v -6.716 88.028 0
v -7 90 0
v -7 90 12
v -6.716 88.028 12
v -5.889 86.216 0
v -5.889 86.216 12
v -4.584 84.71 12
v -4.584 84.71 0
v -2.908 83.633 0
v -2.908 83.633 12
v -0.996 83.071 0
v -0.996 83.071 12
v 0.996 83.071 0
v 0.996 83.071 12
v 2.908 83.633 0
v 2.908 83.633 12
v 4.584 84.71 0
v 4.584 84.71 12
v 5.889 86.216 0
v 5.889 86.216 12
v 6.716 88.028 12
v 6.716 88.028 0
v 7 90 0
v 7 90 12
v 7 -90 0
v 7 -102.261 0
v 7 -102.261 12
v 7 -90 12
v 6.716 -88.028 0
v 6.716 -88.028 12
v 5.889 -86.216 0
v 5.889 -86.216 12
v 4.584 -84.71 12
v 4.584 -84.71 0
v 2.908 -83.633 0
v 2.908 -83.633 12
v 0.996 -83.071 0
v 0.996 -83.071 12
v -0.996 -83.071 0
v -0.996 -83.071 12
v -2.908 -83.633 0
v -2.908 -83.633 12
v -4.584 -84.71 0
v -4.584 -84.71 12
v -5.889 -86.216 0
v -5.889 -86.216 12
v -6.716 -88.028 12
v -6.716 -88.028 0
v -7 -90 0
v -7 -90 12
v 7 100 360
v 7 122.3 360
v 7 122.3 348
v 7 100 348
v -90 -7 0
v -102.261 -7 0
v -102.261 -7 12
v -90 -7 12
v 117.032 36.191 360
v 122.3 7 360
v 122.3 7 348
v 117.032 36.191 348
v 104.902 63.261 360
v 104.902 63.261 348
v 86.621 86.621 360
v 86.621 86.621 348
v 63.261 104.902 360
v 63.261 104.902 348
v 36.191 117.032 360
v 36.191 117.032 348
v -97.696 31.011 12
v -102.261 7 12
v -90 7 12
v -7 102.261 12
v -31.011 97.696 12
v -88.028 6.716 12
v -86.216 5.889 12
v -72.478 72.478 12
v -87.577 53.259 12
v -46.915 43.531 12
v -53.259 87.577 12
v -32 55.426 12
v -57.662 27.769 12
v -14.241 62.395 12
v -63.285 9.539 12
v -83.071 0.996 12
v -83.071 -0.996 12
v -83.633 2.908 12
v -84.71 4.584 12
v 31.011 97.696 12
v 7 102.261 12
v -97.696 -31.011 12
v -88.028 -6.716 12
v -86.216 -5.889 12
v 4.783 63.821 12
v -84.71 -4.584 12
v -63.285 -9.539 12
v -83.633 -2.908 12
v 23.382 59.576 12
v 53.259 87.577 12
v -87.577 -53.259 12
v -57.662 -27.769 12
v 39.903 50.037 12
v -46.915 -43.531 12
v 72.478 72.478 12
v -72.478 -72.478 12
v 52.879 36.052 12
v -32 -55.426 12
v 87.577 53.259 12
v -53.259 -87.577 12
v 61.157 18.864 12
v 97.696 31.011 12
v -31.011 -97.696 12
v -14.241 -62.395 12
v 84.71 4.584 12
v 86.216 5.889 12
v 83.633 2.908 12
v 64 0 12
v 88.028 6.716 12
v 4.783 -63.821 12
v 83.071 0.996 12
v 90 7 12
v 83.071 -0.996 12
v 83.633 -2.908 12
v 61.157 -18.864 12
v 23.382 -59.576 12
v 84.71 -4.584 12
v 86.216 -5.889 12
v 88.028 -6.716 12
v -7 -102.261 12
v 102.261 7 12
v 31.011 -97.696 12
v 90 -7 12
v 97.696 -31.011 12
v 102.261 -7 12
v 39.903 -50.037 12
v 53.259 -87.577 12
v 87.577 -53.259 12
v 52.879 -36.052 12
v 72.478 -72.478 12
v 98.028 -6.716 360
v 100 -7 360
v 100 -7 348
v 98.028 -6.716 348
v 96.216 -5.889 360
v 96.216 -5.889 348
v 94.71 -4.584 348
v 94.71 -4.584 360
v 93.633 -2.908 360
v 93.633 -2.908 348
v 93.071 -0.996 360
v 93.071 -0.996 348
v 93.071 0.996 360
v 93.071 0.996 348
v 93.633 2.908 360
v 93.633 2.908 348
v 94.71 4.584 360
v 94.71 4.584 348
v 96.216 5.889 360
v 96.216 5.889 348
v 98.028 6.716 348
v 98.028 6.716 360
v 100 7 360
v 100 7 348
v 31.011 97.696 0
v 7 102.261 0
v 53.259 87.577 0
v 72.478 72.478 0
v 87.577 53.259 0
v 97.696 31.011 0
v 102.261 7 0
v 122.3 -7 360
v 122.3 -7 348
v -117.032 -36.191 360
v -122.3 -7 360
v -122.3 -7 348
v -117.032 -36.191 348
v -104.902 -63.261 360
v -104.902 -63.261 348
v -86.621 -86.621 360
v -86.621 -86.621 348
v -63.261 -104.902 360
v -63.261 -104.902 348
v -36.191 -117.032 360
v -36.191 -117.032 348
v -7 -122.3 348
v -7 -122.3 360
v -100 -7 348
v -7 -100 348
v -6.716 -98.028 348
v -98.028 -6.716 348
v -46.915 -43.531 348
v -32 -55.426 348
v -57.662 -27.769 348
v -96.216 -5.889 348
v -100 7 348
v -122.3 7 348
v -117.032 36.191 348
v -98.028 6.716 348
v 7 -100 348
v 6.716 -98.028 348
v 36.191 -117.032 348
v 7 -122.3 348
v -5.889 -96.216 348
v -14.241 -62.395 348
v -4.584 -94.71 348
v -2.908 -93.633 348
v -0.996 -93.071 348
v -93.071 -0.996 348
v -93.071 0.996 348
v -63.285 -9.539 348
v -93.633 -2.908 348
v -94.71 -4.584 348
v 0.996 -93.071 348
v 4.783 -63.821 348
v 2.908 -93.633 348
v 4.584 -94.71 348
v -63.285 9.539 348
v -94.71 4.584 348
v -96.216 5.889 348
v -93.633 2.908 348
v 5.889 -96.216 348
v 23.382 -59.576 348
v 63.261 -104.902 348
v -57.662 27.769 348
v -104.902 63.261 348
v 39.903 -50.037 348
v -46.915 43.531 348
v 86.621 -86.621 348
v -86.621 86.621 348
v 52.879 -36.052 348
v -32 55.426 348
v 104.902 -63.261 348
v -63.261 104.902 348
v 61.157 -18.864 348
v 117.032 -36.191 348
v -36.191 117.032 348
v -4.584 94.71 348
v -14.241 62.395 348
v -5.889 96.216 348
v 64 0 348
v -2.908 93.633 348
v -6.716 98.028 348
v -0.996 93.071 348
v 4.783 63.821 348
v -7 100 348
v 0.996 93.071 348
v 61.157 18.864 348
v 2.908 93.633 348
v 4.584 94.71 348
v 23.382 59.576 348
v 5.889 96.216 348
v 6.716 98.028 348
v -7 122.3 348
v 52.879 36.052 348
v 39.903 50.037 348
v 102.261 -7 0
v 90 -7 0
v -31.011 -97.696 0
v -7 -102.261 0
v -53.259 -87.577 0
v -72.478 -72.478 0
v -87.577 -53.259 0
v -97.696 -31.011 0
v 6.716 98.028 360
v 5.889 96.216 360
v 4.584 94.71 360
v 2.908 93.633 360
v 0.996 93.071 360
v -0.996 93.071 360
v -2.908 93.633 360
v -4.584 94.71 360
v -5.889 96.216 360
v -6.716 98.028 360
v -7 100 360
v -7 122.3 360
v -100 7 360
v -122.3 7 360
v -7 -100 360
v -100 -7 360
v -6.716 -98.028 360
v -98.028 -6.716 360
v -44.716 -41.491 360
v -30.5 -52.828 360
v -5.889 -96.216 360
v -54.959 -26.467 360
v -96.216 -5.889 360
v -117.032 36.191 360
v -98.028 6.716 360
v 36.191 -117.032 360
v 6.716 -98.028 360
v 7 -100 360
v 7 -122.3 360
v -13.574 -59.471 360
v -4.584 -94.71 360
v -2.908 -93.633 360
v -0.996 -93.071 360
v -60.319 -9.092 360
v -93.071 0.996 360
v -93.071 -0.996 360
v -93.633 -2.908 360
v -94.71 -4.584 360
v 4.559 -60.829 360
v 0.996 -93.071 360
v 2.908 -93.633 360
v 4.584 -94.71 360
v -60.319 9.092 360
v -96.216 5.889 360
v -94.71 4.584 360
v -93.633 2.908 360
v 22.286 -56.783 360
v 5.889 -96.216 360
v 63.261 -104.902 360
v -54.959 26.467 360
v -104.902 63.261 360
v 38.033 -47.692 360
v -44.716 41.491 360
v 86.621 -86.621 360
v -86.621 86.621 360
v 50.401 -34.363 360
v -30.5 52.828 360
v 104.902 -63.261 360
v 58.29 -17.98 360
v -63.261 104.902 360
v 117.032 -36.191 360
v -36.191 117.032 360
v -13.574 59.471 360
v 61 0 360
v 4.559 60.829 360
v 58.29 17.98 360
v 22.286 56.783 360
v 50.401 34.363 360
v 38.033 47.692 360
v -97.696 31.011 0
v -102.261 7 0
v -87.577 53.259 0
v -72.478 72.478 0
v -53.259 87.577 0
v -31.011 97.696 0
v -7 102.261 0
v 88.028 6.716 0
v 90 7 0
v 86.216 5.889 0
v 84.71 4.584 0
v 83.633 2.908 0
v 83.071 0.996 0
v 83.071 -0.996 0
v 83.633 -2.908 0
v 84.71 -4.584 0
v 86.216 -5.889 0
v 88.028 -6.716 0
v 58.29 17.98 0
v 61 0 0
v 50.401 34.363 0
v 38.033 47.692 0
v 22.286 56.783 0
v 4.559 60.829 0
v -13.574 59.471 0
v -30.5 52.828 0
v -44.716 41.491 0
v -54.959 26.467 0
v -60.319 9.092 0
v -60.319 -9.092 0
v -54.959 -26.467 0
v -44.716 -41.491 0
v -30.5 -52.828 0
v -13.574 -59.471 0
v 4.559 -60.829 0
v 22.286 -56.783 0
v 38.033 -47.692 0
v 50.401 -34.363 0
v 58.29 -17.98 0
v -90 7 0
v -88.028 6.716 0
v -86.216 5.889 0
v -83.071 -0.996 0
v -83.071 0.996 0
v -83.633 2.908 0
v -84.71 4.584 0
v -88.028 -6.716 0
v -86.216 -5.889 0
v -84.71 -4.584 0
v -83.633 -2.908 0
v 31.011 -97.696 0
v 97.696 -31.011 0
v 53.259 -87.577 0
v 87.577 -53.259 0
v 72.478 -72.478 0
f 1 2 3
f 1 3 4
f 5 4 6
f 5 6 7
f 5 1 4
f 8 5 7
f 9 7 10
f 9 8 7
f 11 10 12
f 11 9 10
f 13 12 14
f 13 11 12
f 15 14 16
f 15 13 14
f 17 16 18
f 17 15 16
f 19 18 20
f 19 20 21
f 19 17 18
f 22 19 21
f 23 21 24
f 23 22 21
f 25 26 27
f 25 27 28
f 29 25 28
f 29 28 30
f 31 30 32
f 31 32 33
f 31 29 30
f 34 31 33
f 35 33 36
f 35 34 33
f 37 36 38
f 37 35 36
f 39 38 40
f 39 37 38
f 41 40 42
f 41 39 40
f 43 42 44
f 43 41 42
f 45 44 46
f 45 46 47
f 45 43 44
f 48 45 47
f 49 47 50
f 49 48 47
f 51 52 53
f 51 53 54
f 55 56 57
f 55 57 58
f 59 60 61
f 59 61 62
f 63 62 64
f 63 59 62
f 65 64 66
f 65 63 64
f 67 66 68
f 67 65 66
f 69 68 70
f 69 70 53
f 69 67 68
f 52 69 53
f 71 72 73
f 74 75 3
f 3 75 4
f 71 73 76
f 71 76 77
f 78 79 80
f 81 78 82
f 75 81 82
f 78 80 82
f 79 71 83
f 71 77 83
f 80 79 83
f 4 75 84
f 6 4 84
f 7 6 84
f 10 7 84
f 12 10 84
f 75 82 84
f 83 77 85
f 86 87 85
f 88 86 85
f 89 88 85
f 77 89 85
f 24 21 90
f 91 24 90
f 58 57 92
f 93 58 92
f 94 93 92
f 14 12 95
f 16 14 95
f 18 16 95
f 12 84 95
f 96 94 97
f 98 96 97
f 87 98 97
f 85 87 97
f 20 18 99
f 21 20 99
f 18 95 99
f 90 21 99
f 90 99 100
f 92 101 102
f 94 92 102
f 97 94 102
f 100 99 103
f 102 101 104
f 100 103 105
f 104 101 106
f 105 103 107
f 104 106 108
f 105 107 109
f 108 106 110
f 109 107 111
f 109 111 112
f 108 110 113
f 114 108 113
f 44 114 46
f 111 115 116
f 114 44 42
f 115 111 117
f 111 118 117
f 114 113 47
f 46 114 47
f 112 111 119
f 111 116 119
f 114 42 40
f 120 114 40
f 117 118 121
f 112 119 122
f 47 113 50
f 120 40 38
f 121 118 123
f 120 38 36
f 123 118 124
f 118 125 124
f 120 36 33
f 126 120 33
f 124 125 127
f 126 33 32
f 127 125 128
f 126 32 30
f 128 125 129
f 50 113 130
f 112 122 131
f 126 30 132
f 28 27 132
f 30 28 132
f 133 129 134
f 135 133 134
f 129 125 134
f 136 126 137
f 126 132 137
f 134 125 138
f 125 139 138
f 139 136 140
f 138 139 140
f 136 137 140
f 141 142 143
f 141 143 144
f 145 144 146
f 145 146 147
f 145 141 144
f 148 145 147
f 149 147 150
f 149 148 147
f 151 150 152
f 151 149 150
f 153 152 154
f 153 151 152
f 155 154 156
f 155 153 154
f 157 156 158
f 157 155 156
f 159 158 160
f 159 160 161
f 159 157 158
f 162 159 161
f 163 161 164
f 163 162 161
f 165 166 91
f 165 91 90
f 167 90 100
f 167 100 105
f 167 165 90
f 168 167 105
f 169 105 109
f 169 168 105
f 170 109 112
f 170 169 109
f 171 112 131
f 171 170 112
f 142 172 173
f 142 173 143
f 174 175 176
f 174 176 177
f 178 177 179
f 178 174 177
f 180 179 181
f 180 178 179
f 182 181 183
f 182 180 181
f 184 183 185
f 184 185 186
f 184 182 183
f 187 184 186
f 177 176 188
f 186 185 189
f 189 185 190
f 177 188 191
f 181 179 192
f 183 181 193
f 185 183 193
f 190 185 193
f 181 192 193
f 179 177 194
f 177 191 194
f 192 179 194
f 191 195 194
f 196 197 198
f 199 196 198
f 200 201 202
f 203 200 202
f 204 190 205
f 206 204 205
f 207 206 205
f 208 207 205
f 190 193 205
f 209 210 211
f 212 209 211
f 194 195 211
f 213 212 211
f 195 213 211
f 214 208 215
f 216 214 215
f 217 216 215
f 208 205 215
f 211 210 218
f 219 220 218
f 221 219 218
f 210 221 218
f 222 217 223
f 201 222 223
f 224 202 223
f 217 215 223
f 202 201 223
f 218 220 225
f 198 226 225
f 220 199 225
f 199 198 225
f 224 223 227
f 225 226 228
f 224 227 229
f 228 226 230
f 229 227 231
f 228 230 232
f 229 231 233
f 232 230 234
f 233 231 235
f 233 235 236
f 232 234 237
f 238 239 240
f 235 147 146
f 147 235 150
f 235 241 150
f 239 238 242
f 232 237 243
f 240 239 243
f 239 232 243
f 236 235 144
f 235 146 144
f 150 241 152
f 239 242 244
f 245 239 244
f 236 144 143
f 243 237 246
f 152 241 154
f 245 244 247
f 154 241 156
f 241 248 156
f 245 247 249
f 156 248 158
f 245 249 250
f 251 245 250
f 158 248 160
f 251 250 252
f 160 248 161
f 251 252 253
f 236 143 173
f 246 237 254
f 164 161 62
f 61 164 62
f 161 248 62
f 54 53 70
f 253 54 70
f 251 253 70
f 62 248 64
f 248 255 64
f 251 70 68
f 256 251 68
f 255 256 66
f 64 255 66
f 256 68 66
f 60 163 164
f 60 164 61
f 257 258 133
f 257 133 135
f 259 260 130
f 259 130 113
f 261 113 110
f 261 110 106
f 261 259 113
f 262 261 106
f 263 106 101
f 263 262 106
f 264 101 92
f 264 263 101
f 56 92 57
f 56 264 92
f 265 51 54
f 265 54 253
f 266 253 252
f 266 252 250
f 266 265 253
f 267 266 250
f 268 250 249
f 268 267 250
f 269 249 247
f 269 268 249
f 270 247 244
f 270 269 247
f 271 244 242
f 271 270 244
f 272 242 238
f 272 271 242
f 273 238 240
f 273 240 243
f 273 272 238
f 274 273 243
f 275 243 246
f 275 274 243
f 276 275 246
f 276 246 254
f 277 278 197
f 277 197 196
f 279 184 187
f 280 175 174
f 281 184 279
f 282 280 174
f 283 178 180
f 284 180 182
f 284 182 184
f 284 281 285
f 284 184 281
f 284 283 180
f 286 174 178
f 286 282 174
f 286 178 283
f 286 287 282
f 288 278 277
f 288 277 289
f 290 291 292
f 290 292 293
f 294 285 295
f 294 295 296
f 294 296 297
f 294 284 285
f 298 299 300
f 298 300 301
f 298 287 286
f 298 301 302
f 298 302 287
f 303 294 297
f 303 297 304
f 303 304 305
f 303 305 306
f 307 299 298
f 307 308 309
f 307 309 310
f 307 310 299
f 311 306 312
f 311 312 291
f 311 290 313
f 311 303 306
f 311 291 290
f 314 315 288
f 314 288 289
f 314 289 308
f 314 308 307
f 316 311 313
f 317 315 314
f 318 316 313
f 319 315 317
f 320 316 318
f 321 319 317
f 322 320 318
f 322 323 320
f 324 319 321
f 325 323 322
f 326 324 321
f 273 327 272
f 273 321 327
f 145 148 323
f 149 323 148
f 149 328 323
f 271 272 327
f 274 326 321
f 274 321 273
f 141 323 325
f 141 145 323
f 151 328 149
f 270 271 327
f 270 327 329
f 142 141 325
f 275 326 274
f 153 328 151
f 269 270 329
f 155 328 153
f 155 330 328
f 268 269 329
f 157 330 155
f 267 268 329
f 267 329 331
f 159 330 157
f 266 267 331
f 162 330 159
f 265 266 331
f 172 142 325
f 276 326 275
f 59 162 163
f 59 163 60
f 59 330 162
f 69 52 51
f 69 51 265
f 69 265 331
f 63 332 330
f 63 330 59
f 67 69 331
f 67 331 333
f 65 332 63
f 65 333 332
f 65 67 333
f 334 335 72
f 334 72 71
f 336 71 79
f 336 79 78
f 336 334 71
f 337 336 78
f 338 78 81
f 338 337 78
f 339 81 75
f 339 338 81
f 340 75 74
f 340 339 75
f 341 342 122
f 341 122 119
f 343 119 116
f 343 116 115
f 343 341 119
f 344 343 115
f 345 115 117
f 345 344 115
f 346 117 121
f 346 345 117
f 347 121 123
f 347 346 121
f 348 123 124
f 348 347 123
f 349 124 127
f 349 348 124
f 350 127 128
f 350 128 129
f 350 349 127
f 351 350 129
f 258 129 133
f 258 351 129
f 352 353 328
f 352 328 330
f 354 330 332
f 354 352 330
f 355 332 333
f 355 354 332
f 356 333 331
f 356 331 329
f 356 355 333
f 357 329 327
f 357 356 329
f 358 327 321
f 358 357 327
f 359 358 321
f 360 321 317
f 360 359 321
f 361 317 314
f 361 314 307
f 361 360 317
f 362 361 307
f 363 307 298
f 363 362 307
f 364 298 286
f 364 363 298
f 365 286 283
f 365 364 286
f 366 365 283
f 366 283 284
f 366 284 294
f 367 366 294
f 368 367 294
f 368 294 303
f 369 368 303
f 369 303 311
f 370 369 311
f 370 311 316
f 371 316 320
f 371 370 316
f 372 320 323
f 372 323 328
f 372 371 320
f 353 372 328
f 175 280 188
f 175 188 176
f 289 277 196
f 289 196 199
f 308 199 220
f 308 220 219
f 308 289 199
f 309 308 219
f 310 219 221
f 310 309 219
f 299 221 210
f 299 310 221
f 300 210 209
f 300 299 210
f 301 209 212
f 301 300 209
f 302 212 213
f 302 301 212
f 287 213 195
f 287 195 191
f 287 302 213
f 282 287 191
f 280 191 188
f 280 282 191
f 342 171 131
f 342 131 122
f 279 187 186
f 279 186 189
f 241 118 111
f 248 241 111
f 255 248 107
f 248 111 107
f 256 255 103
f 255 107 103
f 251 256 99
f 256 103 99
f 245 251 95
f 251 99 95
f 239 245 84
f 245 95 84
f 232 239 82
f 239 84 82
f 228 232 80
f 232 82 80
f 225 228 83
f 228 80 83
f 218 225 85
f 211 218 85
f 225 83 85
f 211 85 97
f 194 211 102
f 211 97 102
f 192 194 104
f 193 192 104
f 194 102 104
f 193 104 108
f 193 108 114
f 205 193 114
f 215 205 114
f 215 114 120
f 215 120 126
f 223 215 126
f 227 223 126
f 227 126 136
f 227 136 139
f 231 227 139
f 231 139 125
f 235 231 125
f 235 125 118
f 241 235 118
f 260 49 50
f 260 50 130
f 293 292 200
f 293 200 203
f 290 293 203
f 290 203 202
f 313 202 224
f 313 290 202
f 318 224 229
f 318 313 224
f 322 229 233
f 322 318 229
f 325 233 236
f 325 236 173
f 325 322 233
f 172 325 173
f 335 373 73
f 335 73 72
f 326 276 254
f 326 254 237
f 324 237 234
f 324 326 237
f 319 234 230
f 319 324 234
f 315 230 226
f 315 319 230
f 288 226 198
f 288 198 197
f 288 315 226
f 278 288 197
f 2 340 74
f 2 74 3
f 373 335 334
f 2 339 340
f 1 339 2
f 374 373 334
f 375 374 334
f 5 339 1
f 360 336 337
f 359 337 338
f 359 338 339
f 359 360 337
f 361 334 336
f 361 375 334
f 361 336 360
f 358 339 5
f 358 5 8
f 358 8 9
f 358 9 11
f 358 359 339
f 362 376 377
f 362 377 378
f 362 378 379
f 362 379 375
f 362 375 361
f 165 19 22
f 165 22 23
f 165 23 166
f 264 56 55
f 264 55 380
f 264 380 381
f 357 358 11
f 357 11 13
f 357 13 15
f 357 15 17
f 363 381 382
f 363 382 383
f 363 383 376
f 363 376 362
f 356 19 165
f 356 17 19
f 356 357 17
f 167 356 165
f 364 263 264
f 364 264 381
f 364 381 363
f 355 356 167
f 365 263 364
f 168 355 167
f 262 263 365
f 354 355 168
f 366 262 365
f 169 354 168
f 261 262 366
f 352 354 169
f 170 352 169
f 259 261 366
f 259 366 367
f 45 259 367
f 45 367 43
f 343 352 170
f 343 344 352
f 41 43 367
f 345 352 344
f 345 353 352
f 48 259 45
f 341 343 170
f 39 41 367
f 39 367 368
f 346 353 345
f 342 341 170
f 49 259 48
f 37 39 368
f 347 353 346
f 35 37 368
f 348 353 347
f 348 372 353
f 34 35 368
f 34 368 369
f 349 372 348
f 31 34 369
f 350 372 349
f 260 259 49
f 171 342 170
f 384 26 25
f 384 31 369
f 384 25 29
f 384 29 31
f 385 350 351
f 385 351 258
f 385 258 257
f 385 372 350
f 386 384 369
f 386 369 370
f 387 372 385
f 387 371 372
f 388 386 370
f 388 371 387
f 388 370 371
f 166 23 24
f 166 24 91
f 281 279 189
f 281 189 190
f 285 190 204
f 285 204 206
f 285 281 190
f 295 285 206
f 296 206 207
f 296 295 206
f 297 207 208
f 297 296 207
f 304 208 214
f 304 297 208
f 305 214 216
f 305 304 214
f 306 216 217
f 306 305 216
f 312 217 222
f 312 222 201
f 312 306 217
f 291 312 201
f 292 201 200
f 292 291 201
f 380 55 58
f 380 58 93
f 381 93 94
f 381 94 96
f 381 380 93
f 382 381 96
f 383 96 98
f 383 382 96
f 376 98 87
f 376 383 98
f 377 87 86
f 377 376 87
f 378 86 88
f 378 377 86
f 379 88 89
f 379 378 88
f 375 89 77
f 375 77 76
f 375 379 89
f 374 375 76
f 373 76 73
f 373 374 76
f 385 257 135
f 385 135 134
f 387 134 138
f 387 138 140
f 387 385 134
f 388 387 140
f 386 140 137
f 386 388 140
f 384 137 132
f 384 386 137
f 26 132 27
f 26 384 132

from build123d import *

# Parameters (mm, degrees)
F0_R     = 64
F0_R_2   = 61
F1_DEPTH = 360
F2_R     = 64
F3_DEPTH = 12
F4_R     = 64
F5_DEPTH = 12


with BuildPart() as f1:
    # F0 (on Top) → F1 (new body)
    with BuildSketch(Plane.XY):
        Circle(F0_R)
        Circle(F0_R_2, mode=Mode.SUBTRACT)
    extrude(amount=F1_DEPTH)

    # F2 (on face) → F3 (join)
    with BuildSketch(Plane.XY.offset(360)):
        with BuildLine():
            Line((-100, -7), (-122.299836, -7))
            ThreePointArc((-122.299836, -7), (-86.620581, -86.620581), (-7, -122.299836))
            Line((-7, -122.299836), (-7, -100))
            ThreePointArc((-7, -100), (0, -93), (7, -100))
            Line((7, -100), (7, -122.299836))
            ThreePointArc((7, -122.299836), (86.620581, -86.620581), (122.299836, -7))
            Line((122.299836, -7), (100, -7))
            ThreePointArc((100, -7), (93, 0), (100, 7))
            Line((100, 7), (122.299836, 7))
            ThreePointArc((122.299836, 7), (86.620581, 86.620581), (7, 122.299836))
            Line((7, 122.299836), (7, 100))
            ThreePointArc((7, 100), (0, 93), (-7, 100))
            Line((-7, 100), (-7, 122.299836))
            ThreePointArc((-7, 122.299836), (-86.620581, 86.620581), (-122.299836, 7))
            Line((-122.299836, 7), (-100, 7))
            ThreePointArc((-100, 7), (-93, 0), (-100, -7))
        make_face()
        Circle(F2_R, mode=Mode.SUBTRACT)
    extrude(amount=-F3_DEPTH)

    # F4 (on face) → F5 (join)
    with BuildSketch(Plane(origin=(0, 0, 0), x_dir=(1, 0, 0), z_dir=(0, 0, -1))):
        with BuildLine():
            Line((-7, 90), (-7, 102.260696))
            ThreePointArc((-7, 102.260696), (-72.478445, 72.478445), (-102.260696, 7))
            Line((-102.260696, 7), (-90, 7))
            ThreePointArc((-90, 7), (-83, 0), (-90, -7))
            Line((-90, -7), (-102.260696, -7))
            ThreePointArc((-102.260696, -7), (-72.478445, -72.478445), (-7, -102.260696))
            Line((-7, -102.260696), (-7, -90))
            ThreePointArc((-7, -90), (0, -83), (7, -90))
            Line((7, -90), (7, -102.260696))
            ThreePointArc((7, -102.260696), (72.478445, -72.478445), (102.260696, -7))
            Line((102.260696, -7), (90, -7))
            ThreePointArc((90, -7), (83, 0), (90, 7))
            Line((90, 7), (102.260696, 7))
            ThreePointArc((102.260696, 7), (72.478445, 72.478445), (7, 102.260696))
            Line((7, 102.260696), (7, 90))
            ThreePointArc((7, 90), (0, 83), (-7, 90))
        make_face()
        Circle(F4_R, mode=Mode.SUBTRACT)
    extrude(amount=-F5_DEPTH)


solid = f1.part
